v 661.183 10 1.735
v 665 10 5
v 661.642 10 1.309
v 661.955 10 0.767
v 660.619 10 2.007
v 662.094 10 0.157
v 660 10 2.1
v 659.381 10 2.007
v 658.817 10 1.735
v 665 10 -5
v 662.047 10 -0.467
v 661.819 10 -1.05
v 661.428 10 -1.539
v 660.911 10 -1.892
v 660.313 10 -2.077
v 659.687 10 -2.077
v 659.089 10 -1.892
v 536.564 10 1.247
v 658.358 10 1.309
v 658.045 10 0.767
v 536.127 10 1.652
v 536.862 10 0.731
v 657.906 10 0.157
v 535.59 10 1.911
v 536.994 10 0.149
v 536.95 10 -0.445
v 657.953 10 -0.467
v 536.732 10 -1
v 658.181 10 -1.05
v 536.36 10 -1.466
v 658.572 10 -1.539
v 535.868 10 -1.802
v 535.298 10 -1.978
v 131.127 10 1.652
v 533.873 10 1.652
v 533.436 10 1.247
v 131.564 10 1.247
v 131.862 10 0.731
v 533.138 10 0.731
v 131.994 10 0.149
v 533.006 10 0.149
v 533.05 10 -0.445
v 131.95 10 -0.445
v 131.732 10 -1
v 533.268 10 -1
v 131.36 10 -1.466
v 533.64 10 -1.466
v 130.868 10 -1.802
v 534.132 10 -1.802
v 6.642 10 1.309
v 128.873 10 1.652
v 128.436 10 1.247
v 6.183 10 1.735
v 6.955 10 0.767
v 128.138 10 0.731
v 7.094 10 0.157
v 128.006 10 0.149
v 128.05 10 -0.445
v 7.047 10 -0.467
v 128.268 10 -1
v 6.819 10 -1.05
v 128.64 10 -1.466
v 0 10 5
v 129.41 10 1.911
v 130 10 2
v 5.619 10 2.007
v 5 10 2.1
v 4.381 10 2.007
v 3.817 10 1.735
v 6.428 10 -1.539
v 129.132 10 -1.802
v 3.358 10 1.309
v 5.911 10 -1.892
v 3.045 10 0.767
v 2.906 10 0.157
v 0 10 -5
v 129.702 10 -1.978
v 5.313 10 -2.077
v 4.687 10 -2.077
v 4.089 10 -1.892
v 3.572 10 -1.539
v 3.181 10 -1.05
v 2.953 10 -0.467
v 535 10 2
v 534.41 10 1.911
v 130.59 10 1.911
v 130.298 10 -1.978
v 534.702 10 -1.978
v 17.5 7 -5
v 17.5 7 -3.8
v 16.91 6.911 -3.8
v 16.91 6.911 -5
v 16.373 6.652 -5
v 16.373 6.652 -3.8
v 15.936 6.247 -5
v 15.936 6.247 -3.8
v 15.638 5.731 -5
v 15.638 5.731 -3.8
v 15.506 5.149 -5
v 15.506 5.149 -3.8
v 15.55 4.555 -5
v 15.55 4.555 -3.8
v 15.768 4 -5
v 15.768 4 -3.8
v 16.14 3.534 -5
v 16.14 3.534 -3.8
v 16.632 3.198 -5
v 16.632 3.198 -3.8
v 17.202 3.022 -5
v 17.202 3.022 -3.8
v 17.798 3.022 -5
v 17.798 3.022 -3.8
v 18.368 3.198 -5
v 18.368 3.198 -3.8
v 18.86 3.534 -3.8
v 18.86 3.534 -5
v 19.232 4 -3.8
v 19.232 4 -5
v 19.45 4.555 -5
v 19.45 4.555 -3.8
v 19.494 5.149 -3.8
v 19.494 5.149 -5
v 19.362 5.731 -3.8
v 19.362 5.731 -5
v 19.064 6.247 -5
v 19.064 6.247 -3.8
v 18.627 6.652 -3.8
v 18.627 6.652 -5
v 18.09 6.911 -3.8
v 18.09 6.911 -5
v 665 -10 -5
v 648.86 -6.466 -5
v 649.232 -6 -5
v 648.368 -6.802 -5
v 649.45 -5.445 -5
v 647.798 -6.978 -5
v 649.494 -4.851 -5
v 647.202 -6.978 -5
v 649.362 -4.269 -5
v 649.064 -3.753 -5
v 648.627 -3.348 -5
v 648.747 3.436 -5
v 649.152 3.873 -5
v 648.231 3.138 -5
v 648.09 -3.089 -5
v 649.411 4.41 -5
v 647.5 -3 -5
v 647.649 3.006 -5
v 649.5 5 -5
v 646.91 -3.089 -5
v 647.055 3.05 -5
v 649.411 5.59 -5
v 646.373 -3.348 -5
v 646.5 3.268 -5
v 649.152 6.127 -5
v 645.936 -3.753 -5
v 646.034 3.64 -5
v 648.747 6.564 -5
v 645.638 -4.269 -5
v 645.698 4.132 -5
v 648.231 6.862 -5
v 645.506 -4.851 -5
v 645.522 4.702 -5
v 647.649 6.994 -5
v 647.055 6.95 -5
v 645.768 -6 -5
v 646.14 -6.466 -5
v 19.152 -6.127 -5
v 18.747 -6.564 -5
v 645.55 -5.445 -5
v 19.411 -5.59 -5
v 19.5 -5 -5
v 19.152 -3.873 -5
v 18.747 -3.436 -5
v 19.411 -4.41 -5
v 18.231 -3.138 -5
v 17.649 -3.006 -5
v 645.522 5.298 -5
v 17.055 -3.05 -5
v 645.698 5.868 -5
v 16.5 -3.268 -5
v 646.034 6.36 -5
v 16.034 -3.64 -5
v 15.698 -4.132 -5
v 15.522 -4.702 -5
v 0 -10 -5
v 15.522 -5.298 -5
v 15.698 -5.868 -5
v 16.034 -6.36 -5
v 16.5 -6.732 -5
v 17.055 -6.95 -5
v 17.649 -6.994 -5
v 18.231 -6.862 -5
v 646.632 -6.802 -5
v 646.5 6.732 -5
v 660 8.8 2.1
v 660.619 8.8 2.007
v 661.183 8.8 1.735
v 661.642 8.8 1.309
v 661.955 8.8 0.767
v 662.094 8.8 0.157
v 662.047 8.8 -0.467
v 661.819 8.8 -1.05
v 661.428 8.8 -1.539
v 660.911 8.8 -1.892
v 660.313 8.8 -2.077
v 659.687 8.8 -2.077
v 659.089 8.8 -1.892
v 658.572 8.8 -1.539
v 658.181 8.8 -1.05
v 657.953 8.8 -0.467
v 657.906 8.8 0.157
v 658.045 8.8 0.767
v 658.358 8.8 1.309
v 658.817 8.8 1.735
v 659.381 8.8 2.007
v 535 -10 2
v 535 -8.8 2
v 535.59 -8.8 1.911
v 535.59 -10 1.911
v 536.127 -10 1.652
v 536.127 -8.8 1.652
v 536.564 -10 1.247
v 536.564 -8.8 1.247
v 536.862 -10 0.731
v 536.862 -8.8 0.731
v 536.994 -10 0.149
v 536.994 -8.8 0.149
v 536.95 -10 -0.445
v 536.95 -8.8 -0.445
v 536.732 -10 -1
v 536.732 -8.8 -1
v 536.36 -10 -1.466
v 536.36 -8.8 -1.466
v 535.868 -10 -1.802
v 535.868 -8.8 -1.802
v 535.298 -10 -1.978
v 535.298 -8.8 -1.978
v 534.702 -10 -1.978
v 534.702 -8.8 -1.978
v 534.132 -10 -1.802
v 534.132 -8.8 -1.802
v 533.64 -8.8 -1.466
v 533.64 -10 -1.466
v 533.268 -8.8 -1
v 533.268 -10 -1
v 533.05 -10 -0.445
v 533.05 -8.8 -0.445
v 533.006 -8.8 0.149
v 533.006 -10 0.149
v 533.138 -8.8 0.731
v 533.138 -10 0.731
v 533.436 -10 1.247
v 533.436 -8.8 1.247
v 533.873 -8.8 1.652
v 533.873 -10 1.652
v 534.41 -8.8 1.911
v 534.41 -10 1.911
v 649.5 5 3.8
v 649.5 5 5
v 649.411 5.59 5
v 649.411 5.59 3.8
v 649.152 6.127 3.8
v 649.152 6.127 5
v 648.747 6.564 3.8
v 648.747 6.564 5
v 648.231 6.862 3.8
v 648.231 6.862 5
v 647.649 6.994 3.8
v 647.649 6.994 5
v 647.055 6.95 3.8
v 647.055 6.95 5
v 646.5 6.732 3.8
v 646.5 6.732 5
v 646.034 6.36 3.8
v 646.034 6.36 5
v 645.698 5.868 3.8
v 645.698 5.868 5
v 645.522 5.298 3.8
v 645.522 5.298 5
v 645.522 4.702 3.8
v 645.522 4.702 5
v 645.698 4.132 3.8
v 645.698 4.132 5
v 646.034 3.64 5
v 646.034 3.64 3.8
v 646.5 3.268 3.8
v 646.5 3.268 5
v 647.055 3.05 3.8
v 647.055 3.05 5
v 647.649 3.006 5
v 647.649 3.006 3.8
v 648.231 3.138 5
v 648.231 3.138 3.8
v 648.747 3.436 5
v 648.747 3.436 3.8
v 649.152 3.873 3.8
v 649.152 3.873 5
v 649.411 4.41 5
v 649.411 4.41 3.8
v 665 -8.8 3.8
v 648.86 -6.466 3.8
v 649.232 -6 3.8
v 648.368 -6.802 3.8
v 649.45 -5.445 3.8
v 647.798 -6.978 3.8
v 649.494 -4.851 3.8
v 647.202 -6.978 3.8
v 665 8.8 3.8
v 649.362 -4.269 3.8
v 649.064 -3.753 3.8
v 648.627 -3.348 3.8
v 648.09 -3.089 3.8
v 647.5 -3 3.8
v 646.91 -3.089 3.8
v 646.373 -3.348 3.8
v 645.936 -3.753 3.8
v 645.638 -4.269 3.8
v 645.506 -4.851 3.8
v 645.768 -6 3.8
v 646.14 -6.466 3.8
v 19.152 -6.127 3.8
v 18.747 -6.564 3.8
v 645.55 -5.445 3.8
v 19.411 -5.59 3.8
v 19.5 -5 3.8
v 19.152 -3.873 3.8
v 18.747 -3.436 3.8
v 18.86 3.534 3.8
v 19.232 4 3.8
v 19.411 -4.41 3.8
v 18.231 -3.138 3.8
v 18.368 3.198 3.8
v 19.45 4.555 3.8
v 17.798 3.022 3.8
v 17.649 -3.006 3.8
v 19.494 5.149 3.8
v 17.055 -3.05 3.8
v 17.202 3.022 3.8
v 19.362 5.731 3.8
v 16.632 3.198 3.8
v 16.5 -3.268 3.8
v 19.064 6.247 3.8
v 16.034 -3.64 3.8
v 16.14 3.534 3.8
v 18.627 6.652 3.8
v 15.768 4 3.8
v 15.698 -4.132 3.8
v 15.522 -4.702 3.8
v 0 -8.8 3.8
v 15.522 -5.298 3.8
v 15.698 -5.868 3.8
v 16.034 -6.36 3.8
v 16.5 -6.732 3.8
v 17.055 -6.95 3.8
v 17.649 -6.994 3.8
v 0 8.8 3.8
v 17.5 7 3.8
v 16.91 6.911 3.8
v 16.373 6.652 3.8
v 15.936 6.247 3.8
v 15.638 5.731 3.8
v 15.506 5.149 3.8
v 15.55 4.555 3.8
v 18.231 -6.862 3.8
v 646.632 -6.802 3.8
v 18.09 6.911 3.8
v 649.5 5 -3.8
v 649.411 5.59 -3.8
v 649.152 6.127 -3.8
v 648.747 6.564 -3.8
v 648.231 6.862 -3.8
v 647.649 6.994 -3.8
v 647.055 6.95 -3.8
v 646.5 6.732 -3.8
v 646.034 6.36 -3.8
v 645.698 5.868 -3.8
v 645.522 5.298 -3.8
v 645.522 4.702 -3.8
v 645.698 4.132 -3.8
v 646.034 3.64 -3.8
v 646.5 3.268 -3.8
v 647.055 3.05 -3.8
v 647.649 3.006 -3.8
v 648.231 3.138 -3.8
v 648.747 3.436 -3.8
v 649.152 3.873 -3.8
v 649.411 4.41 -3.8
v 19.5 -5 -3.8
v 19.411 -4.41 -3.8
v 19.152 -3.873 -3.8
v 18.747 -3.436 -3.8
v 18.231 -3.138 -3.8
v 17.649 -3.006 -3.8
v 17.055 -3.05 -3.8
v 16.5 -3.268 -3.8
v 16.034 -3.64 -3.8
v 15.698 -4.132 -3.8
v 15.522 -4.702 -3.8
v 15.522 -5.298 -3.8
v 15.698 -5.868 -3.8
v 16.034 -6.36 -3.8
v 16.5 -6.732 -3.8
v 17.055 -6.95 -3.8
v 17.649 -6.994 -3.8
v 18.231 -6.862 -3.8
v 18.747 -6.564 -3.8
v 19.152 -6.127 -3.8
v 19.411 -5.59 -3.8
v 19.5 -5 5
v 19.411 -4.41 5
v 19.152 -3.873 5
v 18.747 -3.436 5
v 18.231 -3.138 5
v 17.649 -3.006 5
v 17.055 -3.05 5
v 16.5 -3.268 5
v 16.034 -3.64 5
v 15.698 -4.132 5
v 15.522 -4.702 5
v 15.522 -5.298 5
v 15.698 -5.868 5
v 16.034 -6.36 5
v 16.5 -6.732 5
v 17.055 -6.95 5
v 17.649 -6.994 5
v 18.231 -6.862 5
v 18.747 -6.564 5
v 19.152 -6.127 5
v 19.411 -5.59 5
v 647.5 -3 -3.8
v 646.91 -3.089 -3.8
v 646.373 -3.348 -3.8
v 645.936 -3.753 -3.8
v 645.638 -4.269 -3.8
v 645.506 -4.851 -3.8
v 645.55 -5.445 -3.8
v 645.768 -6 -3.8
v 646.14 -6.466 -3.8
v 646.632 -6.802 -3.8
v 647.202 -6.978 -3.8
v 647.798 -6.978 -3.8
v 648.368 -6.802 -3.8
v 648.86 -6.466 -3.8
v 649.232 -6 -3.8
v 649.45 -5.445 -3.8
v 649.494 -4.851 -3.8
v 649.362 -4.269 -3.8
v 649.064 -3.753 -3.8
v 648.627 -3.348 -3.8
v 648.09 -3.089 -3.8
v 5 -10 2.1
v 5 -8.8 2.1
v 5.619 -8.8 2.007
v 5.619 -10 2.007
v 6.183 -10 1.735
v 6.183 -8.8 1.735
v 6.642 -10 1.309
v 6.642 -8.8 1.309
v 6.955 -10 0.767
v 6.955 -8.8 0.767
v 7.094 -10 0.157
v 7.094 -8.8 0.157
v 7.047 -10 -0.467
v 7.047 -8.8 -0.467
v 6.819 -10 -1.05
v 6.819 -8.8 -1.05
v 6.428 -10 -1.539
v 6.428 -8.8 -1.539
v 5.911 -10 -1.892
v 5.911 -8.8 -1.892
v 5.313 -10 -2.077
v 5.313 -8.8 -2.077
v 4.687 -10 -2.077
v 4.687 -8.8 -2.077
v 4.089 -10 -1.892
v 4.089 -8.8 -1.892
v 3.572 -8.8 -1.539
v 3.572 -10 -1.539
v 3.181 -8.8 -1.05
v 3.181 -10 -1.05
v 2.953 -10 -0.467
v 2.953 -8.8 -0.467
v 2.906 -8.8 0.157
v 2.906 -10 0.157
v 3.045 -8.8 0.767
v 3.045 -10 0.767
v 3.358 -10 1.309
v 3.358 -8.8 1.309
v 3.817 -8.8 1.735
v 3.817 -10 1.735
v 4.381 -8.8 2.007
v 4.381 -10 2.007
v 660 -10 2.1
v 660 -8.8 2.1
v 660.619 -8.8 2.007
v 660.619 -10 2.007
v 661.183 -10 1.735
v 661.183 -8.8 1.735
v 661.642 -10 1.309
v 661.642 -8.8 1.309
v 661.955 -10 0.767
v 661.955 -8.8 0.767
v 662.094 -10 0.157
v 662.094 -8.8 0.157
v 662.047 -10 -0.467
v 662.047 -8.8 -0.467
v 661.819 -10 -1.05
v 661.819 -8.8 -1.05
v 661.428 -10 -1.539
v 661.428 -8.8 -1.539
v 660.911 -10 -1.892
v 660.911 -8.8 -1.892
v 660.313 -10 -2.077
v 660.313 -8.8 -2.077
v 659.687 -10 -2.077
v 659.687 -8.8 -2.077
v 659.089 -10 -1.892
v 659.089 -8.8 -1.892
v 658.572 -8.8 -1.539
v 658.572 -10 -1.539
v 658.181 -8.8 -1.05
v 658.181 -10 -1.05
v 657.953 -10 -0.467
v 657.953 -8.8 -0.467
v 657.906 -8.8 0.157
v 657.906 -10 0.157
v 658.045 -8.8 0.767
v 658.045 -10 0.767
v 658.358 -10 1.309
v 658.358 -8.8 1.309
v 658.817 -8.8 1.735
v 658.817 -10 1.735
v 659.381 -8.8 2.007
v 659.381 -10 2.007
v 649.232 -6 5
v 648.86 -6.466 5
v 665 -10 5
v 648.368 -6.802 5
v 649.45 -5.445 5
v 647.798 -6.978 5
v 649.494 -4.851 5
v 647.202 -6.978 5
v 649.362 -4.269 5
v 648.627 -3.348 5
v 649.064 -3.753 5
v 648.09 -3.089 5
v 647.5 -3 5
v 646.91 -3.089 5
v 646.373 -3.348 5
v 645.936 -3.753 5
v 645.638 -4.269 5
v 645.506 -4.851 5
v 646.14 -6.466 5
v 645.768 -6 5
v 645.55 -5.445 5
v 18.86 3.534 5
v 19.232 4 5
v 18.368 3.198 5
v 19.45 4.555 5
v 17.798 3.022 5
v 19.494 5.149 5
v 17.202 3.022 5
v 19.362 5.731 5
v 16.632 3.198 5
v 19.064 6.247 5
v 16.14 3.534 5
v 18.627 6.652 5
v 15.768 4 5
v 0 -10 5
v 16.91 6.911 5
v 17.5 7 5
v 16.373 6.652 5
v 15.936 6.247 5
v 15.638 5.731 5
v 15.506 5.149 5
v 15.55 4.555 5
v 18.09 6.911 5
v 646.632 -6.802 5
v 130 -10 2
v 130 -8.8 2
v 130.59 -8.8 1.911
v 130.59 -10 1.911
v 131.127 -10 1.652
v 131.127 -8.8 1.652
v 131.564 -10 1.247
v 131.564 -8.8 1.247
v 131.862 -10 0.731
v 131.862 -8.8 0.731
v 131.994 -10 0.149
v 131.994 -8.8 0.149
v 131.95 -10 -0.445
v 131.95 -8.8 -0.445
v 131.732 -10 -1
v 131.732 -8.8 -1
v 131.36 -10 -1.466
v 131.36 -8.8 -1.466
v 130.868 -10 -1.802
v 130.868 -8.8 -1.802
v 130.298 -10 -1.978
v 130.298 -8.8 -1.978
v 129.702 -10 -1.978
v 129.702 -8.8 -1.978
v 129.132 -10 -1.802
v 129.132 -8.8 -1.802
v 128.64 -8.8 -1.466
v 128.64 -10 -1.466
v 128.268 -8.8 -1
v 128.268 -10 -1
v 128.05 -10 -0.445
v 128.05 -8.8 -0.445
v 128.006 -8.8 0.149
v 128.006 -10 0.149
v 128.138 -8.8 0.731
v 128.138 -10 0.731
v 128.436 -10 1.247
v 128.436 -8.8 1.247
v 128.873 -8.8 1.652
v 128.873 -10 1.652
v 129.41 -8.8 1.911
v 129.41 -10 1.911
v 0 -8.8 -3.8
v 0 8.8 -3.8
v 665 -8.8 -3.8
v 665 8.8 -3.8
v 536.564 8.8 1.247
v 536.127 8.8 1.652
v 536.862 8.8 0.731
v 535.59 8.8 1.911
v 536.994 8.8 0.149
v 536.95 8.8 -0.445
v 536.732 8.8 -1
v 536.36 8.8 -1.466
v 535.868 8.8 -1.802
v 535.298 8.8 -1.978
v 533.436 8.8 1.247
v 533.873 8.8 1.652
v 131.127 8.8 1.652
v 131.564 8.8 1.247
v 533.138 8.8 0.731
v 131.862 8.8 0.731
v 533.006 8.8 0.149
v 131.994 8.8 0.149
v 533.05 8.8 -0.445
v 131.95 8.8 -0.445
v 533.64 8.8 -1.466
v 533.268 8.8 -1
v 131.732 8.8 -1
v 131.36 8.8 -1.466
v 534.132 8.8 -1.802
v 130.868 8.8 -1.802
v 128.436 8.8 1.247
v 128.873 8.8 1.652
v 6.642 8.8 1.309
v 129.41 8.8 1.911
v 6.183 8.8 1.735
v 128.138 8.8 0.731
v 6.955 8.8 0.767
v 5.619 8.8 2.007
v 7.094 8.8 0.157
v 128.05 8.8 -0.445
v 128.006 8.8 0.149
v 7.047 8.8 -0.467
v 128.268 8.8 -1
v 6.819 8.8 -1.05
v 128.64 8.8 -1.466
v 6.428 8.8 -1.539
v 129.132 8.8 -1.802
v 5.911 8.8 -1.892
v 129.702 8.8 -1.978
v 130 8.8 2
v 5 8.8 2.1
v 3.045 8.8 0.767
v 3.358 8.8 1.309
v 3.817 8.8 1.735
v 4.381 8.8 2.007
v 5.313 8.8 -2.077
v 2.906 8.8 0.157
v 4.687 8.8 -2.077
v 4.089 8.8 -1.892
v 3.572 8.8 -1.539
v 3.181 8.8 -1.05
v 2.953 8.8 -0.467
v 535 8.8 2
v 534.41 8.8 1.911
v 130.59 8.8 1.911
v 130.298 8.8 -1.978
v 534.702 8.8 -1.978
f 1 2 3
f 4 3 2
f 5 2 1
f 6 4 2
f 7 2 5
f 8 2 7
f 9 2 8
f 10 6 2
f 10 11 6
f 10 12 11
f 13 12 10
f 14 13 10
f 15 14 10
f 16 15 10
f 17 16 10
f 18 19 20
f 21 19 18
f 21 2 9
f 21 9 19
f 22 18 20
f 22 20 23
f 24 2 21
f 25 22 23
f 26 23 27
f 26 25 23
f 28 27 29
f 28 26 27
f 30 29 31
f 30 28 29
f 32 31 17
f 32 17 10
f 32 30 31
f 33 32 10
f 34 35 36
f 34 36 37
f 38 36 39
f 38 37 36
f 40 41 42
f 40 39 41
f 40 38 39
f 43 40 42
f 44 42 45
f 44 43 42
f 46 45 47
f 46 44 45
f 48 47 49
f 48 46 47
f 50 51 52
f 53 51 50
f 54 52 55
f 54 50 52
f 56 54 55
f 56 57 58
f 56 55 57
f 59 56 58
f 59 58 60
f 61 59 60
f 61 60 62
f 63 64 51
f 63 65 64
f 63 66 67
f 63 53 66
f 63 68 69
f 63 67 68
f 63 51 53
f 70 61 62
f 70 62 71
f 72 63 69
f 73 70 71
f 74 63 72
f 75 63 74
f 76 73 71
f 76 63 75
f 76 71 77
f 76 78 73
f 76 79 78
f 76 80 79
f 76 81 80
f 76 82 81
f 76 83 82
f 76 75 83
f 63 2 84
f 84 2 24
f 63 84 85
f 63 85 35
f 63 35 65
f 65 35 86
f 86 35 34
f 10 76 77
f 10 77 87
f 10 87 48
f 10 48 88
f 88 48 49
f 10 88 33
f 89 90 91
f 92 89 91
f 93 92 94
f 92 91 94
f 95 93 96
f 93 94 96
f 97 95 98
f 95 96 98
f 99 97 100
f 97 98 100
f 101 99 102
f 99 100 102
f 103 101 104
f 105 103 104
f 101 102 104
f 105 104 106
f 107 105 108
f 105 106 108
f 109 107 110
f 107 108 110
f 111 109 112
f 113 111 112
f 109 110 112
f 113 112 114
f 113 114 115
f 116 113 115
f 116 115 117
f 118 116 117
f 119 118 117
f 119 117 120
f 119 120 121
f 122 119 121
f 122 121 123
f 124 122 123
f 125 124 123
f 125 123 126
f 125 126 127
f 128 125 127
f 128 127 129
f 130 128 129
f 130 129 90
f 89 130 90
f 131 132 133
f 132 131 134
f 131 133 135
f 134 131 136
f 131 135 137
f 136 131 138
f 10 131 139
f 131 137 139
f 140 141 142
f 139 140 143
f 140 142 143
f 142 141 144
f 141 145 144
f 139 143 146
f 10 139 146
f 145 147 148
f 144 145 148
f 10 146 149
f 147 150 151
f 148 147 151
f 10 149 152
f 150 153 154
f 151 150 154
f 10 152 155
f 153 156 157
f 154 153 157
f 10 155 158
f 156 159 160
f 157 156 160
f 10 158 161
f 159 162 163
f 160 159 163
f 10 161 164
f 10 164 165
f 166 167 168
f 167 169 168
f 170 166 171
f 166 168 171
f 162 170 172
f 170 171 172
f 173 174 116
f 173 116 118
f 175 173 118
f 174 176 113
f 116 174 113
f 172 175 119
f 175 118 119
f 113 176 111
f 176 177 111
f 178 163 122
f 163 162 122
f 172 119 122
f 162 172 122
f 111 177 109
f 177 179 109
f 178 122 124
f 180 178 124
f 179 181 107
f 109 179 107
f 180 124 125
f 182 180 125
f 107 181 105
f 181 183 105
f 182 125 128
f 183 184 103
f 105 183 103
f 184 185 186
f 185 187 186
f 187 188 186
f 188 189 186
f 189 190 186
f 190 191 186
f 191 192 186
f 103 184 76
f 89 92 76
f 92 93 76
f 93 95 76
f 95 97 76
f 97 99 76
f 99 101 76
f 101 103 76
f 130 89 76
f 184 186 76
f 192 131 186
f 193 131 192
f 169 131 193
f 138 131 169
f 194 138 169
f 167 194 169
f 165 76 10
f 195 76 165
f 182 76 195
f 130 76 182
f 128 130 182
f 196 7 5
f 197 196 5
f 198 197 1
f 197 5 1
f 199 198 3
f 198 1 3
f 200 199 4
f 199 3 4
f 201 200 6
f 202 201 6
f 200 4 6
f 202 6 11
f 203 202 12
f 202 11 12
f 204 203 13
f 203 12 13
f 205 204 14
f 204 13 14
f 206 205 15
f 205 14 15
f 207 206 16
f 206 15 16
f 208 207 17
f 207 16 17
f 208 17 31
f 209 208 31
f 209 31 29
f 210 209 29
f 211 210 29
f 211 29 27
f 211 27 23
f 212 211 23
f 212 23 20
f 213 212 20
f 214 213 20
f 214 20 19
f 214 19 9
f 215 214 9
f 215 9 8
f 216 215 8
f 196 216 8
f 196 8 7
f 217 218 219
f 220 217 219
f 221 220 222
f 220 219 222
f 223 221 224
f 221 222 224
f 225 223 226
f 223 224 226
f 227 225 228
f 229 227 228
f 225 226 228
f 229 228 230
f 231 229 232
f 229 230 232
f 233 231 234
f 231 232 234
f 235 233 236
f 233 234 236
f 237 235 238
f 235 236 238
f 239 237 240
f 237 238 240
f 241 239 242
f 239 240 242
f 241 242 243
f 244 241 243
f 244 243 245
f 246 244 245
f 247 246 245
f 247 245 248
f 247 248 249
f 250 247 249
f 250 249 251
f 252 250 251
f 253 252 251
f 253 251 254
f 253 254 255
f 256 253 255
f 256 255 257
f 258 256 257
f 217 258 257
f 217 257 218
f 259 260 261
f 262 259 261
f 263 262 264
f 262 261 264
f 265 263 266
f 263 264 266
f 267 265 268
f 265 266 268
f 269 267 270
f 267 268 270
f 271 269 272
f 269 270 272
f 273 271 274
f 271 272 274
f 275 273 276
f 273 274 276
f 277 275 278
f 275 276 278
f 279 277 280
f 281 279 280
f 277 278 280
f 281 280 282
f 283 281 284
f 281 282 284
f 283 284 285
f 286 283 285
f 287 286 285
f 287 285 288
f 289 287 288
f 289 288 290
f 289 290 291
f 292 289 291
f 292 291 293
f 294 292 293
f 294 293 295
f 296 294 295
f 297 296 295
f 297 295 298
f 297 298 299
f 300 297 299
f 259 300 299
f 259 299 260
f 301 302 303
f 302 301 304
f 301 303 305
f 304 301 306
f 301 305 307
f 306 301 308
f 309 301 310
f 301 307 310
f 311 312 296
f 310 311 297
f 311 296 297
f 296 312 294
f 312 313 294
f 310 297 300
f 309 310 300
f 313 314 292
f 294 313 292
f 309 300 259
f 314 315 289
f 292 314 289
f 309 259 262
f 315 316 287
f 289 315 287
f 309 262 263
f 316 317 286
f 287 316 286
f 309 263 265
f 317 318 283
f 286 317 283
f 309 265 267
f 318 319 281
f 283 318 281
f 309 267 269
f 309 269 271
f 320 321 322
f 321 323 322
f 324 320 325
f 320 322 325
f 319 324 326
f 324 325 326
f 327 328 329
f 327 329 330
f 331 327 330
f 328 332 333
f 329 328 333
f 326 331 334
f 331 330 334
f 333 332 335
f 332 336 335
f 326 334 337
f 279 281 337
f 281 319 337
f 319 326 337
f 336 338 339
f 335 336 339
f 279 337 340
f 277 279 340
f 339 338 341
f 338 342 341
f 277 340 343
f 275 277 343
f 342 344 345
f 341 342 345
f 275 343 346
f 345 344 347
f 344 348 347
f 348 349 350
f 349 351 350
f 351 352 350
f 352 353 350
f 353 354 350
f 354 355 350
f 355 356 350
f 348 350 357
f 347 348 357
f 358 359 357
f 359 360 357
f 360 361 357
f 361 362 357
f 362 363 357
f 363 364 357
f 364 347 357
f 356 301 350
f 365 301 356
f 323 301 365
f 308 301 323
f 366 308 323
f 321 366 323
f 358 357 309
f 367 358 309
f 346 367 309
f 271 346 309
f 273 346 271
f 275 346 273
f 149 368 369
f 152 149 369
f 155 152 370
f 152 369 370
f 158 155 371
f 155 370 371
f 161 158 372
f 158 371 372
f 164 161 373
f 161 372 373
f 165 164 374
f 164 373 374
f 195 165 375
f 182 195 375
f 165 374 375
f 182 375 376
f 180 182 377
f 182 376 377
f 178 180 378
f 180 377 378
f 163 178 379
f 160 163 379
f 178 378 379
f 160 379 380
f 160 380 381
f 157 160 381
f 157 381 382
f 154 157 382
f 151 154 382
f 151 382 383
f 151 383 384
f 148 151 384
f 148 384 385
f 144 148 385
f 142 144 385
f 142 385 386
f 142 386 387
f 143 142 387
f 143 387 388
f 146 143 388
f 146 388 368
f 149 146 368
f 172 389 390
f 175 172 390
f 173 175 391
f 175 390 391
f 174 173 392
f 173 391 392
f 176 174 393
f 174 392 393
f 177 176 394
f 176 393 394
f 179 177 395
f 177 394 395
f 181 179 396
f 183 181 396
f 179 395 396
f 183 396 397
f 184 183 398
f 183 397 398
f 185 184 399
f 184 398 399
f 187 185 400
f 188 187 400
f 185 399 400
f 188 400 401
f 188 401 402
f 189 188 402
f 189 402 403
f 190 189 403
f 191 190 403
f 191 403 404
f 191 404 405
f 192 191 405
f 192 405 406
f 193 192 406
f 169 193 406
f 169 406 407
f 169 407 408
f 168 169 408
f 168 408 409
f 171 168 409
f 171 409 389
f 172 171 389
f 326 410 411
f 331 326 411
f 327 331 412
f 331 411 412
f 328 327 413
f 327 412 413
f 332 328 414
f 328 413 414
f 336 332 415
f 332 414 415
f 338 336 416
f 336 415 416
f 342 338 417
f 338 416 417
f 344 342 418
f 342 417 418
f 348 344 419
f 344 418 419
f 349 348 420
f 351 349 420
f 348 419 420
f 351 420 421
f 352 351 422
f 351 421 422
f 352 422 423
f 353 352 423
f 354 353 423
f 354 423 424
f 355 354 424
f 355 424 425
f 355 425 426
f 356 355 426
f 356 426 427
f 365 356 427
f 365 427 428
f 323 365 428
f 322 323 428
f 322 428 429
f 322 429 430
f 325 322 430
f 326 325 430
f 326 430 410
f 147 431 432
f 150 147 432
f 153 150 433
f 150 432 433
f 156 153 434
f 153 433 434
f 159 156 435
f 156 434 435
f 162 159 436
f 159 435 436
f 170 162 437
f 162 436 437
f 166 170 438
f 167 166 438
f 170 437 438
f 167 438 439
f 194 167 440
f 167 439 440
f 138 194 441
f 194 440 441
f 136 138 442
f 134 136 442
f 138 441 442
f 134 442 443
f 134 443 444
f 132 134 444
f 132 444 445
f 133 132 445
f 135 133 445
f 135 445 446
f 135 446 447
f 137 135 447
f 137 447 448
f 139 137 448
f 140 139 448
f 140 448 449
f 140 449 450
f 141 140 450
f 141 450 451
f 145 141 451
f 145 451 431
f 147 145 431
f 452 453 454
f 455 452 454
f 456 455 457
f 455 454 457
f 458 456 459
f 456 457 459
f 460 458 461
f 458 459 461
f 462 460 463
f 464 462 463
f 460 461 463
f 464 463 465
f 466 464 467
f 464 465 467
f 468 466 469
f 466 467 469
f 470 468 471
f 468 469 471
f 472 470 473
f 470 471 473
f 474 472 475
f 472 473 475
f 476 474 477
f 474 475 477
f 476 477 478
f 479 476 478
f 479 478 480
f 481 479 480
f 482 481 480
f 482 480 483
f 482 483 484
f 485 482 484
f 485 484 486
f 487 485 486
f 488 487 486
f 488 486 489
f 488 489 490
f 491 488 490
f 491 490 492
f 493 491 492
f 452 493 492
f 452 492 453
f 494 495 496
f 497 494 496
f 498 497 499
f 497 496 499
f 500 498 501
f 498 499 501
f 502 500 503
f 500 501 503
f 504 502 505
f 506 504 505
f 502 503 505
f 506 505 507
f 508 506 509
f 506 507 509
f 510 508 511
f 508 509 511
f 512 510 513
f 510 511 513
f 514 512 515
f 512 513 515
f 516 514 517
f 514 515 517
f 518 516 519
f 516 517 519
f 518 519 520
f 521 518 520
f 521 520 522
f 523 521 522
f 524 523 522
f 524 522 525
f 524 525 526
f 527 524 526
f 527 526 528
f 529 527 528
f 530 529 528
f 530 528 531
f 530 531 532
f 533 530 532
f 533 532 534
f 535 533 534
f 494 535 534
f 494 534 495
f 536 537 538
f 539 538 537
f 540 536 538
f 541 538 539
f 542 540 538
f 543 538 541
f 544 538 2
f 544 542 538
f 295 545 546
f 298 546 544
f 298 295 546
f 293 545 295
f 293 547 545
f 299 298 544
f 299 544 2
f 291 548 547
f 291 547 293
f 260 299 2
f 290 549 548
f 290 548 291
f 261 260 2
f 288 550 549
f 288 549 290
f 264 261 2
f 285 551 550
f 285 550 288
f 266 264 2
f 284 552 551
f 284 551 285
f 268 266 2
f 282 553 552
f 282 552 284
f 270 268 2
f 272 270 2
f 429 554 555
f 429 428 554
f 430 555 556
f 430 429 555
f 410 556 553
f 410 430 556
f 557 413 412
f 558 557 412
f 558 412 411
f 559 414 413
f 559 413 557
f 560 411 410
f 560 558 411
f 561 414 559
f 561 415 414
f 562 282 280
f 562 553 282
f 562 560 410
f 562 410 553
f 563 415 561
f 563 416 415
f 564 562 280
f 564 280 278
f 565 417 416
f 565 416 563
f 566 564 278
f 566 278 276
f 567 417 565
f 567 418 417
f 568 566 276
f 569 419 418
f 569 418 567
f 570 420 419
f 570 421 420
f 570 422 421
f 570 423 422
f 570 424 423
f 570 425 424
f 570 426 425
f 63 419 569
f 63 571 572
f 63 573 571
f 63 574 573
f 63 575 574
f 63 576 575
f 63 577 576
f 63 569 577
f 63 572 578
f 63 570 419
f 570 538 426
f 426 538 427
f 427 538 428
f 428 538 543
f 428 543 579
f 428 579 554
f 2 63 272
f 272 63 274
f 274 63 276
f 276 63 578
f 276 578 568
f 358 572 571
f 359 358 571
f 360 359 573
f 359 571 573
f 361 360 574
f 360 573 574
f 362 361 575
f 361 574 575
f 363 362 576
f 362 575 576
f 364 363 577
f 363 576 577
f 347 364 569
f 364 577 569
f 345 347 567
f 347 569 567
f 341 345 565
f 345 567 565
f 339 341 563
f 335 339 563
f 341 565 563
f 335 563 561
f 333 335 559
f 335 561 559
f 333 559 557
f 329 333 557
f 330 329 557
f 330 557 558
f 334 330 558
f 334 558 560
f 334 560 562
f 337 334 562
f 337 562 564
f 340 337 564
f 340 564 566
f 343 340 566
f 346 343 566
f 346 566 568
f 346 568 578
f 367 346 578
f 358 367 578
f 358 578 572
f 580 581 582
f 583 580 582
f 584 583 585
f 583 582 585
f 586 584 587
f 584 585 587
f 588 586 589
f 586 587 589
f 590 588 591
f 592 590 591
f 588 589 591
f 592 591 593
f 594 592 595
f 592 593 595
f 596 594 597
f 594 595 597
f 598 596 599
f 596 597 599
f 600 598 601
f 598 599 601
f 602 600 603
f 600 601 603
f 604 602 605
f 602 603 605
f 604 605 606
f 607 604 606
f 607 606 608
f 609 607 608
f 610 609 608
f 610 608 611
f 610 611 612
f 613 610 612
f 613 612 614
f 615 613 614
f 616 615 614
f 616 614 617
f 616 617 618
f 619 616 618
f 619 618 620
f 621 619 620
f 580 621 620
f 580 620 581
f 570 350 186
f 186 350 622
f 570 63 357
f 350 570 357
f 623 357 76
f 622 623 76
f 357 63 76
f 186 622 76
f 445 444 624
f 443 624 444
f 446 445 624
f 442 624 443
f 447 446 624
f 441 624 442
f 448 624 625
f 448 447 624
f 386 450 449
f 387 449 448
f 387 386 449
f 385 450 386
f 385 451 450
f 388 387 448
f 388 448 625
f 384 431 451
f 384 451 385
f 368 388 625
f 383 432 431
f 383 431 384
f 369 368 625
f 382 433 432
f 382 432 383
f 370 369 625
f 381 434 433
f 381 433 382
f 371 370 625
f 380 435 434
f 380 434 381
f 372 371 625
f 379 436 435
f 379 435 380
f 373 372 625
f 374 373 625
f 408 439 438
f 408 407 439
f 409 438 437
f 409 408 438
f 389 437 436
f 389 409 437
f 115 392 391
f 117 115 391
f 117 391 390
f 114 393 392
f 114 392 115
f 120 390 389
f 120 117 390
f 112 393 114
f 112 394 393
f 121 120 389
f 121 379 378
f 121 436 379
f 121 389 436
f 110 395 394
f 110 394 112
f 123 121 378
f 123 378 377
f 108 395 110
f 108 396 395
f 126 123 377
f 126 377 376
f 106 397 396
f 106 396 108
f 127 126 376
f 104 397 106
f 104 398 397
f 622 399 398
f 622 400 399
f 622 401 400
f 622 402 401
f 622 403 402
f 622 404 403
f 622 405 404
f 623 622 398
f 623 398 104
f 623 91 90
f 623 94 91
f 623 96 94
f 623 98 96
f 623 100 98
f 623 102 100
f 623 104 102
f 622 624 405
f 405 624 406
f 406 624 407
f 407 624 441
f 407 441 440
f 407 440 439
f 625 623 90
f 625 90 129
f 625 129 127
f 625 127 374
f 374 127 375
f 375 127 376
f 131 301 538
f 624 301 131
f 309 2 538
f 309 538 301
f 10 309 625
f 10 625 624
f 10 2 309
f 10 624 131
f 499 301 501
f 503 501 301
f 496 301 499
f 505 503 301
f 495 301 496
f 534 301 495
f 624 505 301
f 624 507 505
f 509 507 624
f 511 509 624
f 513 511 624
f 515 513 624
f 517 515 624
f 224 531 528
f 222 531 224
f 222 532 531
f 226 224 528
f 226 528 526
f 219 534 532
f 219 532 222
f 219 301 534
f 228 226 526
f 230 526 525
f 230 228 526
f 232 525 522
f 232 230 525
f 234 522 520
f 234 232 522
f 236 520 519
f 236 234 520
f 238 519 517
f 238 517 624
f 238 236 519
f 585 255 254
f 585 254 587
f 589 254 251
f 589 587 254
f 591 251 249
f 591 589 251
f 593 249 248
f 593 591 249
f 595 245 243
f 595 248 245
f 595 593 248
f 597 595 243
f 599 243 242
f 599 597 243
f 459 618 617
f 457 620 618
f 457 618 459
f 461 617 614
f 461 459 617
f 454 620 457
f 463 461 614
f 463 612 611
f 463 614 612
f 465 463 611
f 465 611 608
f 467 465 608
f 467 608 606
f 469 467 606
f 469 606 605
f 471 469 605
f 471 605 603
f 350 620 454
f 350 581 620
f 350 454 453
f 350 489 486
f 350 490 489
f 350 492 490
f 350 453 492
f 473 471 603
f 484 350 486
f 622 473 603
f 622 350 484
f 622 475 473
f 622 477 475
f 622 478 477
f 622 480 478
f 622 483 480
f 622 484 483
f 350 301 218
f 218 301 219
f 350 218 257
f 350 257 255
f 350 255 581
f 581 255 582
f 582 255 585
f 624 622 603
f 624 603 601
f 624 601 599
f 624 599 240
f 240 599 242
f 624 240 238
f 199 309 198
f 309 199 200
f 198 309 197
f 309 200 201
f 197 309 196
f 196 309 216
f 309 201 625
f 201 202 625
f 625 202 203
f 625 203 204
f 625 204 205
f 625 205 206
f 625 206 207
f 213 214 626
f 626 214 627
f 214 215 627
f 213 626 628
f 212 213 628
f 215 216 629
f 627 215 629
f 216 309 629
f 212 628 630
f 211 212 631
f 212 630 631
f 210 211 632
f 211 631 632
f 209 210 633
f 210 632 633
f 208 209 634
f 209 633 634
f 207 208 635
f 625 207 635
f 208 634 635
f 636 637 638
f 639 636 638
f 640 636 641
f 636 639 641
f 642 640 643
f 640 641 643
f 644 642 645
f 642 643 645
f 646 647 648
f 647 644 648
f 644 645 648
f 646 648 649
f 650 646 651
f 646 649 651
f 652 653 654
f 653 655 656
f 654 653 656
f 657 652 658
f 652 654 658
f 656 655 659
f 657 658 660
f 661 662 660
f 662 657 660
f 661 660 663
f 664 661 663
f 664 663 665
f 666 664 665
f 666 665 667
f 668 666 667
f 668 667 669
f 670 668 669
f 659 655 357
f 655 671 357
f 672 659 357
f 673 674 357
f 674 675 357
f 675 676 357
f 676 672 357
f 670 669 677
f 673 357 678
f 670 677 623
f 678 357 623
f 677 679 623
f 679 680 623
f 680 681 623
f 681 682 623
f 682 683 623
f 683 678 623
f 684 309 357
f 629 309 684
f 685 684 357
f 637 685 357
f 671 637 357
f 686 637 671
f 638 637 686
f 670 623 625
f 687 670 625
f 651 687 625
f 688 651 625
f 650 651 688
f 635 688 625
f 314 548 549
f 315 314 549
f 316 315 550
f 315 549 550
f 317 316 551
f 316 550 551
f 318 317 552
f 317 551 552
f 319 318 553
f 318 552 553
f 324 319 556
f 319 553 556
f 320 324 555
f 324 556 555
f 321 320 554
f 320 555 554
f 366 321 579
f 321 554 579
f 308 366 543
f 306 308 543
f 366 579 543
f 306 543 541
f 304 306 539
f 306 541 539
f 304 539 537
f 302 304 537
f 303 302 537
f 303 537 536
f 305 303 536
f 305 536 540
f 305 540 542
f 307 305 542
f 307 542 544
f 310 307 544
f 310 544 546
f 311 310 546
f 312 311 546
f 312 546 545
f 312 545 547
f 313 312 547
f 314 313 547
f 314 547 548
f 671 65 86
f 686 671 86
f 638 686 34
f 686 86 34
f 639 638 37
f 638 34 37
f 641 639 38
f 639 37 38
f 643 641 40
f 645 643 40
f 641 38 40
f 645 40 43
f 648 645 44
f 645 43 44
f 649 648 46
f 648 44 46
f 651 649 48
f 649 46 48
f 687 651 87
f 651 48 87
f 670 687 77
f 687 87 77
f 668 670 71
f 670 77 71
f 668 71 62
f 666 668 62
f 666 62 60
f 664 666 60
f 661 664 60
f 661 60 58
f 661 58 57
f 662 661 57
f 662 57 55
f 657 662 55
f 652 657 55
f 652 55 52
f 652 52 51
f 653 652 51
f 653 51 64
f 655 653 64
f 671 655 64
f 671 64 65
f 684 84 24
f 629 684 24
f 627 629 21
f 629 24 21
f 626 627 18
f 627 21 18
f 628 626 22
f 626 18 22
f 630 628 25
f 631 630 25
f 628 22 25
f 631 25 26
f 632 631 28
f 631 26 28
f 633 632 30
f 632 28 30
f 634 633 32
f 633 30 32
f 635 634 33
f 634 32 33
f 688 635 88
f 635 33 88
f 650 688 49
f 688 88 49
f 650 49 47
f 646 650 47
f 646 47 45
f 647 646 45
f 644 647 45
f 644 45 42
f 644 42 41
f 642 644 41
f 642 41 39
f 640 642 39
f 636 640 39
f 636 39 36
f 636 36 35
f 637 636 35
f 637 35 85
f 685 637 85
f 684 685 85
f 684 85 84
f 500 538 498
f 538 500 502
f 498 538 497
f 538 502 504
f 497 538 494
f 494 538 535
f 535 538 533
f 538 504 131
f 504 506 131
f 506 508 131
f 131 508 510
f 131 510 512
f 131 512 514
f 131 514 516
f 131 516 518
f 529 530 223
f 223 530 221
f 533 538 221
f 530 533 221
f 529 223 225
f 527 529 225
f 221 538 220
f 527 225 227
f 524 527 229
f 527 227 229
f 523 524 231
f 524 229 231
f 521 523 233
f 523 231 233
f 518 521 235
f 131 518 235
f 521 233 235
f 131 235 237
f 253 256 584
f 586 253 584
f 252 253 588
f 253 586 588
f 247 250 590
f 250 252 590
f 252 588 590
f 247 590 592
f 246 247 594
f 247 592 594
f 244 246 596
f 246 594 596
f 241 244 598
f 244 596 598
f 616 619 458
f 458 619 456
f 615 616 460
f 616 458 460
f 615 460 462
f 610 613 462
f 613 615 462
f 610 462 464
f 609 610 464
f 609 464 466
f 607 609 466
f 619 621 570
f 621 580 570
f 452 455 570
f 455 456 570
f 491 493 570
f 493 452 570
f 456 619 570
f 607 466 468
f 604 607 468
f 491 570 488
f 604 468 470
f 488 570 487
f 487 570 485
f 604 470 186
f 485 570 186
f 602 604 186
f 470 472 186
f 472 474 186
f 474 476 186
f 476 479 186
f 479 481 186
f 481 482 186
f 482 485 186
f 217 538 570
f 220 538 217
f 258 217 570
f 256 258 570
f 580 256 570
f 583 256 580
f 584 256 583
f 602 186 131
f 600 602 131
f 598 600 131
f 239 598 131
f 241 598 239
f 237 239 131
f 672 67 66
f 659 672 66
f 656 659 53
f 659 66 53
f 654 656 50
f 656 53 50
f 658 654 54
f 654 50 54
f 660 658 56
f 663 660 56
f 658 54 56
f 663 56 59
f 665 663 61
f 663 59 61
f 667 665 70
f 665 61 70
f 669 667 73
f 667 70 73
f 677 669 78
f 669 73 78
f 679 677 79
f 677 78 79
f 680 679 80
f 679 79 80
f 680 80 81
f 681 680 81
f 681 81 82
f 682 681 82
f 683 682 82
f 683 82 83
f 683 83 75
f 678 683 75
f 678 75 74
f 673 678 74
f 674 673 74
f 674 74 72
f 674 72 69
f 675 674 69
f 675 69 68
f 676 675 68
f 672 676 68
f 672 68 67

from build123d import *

# Parameters (mm, degrees)
SKETCH_1_W          = 10
SKETCH_1_H          = 20
SKETCH_1_W_2        = 7.6
SKETCH_1_H_2        = 17.6
EXTRUDE_1_DEPTH     = 665
SKETCH_2_R          = 2
CUT_EXTRUDE_1_DEPTH = 666.150358941
SKETCH_3_R          = 2
SKETCH_3_R_2        = 2.1
CUT_EXTRUDE_2_DEPTH = 666.319472134


with BuildPart() as part:
    # ｽｹｯﾁ1 → 押し出し-薄板1 (new body)
    with BuildSketch(Plane(origin=(0, 0, 0), x_dir=(0, 0, -1), z_dir=(1, 0, 0))):
        Rectangle(SKETCH_1_W, SKETCH_1_H)
        Rectangle(SKETCH_1_W_2, SKETCH_1_H_2, mode=Mode.SUBTRACT)
    extrude(amount=EXTRUDE_1_DEPTH)

    # ｽｹｯﾁ2 → ｶｯﾄ - 押し出し1 (cut, through all)
    with BuildSketch(Plane.XY.offset(5)):
        with Locations((647.5, 5)):
            Circle(SKETCH_2_R)
        with Locations(Location((647.5, -5, 0), (0, 0, 90))):
            Circle(SKETCH_2_R)
        with Locations((17.5, -5)):
            Circle(SKETCH_2_R)
        with Locations(Location((17.5, 5, 0), (0, 0, 90))):
            Circle(SKETCH_2_R)
    extrude(amount=-CUT_EXTRUDE_1_DEPTH, mode=Mode.SUBTRACT)

    # ｽｹｯﾁ3 → ｶｯﾄ - 押し出し2 (cut, through all)
    with BuildSketch(Plane(origin=(0, 10, 0), x_dir=(1, 0, 0), z_dir=(0, 1, 0))):
        with Locations(Location((130, 0, 0), (0, 0, 270))):
            Circle(SKETCH_3_R)
        with Locations(Location((535, 0, 0), (0, 0, 270))):
            Circle(SKETCH_3_R)
        with Locations(Location((5, 0, 0), (0, 0, 270))):
            Circle(SKETCH_3_R_2)
        with Locations(Location((660, 0, 0), (0, 0, 270))):
            Circle(SKETCH_3_R_2)
    extrude(amount=-CUT_EXTRUDE_2_DEPTH, mode=Mode.SUBTRACT)


solid = part.part
